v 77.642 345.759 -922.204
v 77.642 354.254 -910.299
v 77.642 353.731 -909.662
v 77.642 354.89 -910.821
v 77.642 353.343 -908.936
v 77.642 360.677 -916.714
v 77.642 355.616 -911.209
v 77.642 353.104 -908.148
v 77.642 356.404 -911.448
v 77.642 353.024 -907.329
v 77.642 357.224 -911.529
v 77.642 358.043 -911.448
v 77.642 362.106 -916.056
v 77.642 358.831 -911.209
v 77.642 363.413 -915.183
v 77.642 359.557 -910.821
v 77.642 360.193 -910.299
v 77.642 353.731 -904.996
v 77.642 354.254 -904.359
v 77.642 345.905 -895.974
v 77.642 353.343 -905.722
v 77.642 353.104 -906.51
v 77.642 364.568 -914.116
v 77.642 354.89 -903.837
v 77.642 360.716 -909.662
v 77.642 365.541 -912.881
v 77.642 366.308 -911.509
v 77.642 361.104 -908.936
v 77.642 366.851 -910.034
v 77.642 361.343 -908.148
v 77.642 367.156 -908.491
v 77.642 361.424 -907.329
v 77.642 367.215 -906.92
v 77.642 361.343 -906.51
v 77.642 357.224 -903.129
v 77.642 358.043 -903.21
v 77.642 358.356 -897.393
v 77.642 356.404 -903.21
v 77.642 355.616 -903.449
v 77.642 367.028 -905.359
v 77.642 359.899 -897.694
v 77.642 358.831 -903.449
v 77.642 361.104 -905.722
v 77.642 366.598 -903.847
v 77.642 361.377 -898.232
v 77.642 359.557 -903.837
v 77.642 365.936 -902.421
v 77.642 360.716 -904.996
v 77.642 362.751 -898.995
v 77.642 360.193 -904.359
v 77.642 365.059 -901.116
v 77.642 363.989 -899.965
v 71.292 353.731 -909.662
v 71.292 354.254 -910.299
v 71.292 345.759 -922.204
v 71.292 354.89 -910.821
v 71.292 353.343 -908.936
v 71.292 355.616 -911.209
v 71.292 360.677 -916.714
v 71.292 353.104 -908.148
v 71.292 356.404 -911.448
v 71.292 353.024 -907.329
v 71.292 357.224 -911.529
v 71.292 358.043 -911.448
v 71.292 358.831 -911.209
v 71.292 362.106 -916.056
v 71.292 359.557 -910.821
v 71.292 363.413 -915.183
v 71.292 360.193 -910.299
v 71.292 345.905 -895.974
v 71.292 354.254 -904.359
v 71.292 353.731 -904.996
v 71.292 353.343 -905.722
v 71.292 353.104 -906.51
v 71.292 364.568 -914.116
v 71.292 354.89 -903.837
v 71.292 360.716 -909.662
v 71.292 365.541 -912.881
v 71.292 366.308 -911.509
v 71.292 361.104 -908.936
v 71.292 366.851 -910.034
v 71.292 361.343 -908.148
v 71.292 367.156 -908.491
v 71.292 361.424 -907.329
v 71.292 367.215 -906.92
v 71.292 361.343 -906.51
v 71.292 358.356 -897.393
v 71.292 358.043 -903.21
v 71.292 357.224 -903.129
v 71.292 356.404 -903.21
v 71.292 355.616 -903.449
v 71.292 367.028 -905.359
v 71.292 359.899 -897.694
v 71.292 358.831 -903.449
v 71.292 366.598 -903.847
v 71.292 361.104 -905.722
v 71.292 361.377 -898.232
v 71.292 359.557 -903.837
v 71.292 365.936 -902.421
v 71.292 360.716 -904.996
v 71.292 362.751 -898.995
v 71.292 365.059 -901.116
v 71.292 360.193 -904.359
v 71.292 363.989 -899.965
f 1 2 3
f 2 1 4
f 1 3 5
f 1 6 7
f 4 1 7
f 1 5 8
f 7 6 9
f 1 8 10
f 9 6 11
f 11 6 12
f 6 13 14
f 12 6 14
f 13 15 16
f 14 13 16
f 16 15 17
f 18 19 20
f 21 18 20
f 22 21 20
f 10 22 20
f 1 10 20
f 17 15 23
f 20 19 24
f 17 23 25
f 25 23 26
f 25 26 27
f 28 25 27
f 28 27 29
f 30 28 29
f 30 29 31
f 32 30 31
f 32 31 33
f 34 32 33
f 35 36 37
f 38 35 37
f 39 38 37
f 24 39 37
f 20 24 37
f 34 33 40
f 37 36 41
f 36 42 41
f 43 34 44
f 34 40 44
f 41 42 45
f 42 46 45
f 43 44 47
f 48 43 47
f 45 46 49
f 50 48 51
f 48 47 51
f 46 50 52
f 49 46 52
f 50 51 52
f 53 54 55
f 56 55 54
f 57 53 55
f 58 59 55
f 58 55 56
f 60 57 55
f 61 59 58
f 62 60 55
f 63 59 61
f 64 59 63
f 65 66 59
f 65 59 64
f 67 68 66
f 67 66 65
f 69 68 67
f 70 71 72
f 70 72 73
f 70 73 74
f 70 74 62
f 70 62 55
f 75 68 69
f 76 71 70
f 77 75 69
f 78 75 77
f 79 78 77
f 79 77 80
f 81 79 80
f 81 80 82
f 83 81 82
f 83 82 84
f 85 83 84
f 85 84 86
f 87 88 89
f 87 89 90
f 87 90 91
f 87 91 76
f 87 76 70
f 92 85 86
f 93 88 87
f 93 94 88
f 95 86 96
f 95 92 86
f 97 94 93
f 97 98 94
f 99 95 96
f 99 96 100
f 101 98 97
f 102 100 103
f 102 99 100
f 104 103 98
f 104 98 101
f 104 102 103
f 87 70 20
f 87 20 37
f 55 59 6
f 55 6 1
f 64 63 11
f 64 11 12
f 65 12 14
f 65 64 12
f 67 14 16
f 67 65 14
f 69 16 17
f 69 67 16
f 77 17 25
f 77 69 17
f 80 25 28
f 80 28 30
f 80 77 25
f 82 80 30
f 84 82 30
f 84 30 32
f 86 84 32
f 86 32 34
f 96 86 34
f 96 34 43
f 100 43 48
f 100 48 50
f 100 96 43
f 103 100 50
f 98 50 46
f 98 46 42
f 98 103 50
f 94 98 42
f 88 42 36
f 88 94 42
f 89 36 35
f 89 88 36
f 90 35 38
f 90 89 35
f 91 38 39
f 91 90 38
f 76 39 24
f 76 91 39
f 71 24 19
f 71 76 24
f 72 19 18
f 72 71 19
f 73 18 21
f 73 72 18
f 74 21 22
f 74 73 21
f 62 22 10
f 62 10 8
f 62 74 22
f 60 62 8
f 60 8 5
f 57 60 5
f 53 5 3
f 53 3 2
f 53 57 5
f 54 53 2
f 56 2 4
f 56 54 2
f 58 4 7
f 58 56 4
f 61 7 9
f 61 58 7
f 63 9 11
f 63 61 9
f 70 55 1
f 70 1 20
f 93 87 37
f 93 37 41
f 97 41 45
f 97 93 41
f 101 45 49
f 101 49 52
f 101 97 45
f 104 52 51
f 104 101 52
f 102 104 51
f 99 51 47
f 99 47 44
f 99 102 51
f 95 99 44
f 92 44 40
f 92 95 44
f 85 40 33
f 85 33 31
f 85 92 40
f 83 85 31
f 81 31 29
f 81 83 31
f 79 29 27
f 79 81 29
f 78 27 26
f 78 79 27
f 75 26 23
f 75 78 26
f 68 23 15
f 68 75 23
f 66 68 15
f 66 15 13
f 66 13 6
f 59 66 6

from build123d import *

# Parameters (mm, degrees)
SKETCH1_R           = 4.2
BOSS_EXTRUDE1_DEPTH = 6.35


with BuildPart() as part:
    # Sketch1 → Boss-Extrude1 (new body)
    with BuildSketch(Plane(origin=(71.29240007, 0, 0), x_dir=(0, 0, -1), z_dir=(1, 0, 0))):
        with BuildLine():
            Line((916.713582015, 360.677443288), (922.204212824, 345.758563031))
            Line((922.204212824, 345.758563031), (895.973808013, 345.904541612))
            Line((895.973808013, 345.904541612), (897.39332308, 358.356278755))
            ThreePointArc((897.39332308, 358.356278755), (906.13613116, 367.152203744), (916.713582015, 360.677443288))
        make_face()
        with Locations((907.328968128, 357.223601629)):
            Circle(SKETCH1_R, mode=Mode.SUBTRACT)
    extrude(amount=BOSS_EXTRUDE1_DEPTH)


solid = part.part
